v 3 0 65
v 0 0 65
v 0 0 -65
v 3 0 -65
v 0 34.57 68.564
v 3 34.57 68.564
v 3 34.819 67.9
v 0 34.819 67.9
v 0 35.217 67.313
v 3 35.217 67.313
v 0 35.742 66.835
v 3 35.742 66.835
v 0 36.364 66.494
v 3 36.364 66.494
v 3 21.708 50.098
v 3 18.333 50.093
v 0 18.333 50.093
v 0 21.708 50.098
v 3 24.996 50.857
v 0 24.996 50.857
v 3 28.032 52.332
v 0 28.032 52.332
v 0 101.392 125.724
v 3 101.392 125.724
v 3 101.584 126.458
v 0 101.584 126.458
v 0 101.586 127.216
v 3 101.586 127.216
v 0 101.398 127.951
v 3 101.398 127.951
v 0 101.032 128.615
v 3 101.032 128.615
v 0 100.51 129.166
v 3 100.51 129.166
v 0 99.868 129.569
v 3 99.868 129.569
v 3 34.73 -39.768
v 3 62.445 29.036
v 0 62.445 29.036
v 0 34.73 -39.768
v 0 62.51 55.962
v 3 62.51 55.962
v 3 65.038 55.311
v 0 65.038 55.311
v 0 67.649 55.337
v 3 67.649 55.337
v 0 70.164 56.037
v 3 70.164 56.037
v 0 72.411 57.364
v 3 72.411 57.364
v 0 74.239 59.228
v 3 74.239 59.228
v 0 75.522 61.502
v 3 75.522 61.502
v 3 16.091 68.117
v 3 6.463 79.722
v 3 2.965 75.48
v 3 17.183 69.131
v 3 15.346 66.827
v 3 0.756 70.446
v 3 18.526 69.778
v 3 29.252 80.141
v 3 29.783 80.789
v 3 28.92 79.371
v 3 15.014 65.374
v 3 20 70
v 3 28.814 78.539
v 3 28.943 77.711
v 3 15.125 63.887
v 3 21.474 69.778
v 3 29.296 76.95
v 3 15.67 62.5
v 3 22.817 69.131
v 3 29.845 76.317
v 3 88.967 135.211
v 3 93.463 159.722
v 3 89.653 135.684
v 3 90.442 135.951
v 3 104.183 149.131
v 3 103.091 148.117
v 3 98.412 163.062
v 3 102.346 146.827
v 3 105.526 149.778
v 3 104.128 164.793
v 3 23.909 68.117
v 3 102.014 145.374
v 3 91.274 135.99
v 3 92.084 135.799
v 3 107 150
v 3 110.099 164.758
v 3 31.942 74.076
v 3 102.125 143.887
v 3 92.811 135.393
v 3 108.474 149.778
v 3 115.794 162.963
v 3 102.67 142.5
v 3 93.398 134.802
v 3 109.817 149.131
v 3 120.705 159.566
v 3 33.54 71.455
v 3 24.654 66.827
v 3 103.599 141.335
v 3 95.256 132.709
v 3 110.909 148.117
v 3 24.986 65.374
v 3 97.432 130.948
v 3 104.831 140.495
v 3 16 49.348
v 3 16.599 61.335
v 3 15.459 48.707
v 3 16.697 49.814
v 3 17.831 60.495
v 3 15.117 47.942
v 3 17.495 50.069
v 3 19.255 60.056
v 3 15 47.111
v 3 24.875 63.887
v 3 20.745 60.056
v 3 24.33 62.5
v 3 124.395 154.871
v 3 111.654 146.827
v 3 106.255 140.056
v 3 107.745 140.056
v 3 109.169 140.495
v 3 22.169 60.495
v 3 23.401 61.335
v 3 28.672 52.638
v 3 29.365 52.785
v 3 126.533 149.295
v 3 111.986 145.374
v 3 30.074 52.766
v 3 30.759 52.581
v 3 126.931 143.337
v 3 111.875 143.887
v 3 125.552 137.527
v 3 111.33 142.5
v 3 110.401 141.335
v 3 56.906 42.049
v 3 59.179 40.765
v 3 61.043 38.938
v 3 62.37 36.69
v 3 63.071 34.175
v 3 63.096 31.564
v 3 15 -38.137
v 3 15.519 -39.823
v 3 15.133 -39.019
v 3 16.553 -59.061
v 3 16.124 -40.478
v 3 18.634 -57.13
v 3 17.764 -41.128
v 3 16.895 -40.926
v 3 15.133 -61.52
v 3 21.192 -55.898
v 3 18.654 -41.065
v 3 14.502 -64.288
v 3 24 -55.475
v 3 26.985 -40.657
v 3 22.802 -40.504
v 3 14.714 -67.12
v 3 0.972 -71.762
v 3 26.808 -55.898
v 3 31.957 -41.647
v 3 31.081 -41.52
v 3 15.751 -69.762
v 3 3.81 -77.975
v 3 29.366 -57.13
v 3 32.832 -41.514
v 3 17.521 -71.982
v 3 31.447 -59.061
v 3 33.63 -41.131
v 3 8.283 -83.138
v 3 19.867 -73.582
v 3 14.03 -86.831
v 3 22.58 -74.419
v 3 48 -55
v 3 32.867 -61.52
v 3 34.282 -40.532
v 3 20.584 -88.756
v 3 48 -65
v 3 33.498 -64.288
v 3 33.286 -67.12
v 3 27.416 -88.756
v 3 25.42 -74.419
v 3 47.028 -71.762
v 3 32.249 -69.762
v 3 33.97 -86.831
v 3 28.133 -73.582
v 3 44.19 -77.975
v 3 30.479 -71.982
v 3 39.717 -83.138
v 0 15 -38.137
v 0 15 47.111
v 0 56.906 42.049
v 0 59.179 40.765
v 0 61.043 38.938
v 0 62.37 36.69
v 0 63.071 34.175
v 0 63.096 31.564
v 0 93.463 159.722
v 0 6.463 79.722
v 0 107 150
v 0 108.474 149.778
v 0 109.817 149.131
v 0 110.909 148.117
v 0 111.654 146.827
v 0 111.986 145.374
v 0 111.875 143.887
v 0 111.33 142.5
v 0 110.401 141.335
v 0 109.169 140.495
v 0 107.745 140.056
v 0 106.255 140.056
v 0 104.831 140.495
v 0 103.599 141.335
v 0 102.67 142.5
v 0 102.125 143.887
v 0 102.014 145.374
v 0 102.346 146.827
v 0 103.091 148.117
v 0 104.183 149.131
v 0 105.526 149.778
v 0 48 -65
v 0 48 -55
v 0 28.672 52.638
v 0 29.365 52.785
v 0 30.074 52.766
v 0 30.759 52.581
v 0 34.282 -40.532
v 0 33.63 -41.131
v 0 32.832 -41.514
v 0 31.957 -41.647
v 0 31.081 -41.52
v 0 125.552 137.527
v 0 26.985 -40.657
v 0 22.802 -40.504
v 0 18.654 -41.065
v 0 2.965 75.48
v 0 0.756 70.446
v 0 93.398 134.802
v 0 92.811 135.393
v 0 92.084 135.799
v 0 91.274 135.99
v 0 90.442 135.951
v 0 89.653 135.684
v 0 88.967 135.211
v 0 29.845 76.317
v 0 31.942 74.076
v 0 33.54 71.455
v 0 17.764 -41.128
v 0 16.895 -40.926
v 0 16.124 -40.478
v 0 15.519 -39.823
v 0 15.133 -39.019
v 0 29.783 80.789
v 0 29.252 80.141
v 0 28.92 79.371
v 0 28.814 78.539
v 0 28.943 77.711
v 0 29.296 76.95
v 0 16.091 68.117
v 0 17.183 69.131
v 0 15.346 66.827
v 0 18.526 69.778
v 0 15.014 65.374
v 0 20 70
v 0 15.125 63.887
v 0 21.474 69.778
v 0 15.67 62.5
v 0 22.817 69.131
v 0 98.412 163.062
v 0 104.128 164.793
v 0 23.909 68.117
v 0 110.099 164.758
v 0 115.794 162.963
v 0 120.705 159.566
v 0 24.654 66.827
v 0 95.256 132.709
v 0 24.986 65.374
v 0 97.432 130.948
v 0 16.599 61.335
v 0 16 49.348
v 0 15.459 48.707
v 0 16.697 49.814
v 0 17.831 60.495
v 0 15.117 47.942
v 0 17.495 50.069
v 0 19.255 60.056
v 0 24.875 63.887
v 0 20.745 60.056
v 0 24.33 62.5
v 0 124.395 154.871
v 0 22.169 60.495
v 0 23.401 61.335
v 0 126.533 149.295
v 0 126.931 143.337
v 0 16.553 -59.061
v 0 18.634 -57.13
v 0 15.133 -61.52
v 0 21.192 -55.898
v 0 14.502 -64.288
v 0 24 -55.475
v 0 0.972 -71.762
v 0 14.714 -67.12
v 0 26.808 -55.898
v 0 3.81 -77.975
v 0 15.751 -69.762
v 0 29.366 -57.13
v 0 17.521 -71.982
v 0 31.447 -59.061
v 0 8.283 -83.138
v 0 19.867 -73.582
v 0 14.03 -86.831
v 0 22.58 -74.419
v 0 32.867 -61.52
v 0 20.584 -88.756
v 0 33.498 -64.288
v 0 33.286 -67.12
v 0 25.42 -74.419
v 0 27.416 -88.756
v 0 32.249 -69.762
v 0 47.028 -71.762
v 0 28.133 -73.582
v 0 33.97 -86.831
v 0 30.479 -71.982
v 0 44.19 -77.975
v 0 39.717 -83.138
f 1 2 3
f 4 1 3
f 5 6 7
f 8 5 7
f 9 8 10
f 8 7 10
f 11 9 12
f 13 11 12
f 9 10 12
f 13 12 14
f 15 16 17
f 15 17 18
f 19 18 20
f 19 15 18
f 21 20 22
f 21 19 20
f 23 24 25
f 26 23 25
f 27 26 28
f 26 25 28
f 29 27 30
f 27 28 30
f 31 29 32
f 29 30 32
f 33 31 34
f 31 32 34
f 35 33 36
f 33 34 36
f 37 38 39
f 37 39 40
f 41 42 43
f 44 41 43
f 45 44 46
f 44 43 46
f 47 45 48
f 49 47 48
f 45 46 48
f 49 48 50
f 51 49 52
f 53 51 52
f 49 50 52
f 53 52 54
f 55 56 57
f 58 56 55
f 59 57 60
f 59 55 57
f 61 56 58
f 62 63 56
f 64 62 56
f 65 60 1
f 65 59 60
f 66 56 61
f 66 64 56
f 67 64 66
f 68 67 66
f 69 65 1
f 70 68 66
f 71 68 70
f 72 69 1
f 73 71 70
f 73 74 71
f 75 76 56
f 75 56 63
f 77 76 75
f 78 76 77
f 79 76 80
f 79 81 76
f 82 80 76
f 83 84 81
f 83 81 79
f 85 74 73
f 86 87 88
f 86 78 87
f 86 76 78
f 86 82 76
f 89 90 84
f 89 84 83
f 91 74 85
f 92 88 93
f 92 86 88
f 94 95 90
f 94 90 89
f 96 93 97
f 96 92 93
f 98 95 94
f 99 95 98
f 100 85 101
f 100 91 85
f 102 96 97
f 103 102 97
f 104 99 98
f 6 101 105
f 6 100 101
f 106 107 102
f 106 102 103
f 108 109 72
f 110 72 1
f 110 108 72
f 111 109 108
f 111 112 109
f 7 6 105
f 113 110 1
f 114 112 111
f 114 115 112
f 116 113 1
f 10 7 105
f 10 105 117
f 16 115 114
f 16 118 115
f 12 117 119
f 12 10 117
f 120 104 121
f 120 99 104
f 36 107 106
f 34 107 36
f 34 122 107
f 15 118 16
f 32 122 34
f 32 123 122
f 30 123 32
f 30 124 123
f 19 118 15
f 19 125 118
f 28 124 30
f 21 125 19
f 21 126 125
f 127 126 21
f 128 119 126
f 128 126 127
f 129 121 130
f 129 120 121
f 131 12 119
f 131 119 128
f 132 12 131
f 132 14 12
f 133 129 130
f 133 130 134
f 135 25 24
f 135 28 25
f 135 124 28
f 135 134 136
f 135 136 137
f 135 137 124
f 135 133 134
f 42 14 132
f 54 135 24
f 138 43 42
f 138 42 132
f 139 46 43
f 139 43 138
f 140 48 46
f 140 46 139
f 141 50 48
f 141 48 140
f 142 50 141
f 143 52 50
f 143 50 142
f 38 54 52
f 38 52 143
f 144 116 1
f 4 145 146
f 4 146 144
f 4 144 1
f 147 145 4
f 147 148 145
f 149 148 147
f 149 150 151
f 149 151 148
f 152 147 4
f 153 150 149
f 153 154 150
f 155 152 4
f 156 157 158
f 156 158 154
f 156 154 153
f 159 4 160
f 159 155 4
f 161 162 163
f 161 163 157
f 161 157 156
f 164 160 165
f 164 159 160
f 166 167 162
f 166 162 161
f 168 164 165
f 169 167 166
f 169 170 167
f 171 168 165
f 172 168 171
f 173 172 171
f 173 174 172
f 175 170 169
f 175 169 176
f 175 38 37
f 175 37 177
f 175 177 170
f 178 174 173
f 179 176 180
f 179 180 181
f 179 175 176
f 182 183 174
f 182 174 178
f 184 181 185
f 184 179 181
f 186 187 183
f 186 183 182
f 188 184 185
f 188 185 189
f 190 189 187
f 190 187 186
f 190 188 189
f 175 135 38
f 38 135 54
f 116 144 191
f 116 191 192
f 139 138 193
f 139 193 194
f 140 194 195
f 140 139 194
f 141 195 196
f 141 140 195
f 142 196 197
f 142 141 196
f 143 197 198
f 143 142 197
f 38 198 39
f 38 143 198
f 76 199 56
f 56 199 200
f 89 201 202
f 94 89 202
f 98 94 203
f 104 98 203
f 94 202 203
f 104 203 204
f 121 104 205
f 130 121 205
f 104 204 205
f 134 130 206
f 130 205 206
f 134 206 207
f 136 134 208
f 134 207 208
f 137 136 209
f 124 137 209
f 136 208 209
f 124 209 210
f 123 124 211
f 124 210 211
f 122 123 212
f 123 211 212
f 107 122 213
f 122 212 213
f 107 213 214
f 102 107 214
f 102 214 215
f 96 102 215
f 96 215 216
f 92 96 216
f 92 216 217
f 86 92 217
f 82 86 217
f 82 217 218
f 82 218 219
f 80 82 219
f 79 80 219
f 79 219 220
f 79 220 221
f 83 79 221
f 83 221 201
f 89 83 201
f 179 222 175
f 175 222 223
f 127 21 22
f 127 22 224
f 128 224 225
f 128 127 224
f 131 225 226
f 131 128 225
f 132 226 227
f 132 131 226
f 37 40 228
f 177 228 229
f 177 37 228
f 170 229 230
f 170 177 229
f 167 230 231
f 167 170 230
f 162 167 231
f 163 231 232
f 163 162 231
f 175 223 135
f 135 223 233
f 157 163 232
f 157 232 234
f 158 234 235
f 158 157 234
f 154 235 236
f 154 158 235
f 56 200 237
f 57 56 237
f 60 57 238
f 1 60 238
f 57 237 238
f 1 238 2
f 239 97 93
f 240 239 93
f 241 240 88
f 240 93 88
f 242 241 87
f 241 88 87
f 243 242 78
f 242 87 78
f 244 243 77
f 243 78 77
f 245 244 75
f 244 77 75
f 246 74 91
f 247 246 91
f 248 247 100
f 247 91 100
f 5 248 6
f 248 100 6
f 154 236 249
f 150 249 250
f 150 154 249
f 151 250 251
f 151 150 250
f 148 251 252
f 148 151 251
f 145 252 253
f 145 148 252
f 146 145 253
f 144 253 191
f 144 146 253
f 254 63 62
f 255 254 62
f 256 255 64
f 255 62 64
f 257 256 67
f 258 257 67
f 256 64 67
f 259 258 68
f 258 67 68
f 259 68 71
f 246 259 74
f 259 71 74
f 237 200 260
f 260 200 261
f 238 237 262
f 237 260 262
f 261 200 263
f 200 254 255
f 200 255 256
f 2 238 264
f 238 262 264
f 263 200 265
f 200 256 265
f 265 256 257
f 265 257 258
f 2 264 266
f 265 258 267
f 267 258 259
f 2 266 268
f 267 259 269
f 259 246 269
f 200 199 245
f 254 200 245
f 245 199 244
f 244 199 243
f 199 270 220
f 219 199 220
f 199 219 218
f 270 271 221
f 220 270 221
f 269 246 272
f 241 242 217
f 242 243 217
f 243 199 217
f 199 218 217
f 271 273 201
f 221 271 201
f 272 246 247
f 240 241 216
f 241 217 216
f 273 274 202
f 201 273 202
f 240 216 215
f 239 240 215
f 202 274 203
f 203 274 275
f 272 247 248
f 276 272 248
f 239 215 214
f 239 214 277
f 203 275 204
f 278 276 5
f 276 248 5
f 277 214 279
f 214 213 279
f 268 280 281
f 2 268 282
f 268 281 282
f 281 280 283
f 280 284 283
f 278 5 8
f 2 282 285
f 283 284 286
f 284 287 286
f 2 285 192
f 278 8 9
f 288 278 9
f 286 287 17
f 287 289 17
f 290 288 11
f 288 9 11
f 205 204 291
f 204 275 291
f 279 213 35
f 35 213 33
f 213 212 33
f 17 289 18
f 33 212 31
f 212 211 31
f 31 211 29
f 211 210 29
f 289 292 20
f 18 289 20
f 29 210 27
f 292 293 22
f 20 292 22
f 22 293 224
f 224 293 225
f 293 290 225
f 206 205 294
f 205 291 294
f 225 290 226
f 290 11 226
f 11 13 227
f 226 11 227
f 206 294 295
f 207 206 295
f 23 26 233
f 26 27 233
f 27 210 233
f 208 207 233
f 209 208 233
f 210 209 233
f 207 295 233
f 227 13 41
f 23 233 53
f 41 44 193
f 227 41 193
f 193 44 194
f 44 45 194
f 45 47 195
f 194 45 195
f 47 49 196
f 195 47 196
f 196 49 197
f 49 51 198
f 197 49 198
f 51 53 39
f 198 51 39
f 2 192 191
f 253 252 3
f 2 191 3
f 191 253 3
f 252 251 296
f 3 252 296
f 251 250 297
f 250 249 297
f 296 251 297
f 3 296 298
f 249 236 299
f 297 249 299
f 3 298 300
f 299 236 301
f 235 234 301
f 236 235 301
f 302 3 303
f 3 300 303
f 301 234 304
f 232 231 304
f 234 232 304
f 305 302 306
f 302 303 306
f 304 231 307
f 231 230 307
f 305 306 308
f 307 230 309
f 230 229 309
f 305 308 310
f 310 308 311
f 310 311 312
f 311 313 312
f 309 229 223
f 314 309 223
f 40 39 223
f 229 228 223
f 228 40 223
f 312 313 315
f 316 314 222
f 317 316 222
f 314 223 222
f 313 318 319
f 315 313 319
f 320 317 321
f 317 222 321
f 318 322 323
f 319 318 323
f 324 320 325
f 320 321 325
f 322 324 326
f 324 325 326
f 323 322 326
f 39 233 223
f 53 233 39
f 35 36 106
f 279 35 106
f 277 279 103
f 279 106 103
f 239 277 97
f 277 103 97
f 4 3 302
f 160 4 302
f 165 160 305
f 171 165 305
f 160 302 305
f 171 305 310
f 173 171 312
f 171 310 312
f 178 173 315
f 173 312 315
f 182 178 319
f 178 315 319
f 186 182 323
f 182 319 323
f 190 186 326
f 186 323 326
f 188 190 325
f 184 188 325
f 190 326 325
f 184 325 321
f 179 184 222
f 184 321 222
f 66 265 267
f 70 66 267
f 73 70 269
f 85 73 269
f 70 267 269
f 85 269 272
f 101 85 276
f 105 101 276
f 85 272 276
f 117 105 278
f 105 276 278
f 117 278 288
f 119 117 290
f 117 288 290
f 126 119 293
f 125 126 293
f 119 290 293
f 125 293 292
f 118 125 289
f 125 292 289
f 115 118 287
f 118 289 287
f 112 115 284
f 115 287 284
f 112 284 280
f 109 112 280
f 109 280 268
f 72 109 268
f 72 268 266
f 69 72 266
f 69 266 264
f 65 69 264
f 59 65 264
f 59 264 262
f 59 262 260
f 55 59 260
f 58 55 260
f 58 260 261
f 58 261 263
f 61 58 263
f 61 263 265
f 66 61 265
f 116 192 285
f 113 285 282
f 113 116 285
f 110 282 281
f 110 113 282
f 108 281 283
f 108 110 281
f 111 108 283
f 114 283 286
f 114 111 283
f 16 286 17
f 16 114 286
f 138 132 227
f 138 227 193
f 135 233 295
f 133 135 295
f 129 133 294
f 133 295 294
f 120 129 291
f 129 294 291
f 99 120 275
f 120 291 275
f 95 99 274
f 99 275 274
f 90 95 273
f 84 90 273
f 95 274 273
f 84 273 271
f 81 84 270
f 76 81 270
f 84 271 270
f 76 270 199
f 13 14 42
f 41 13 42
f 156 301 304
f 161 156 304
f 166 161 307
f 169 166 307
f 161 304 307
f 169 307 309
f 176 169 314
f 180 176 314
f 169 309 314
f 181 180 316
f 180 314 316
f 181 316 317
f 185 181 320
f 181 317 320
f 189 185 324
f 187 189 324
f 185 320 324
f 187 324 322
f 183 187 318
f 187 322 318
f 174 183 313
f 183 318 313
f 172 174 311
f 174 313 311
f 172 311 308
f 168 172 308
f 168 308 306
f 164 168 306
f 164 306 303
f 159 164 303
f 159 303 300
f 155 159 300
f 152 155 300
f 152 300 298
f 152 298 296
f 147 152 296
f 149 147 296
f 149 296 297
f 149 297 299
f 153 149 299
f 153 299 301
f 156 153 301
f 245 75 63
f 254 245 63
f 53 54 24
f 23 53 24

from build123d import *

# Parameters (mm, degrees)
BOSS_EXTRUDE1_DEPTH         = 3
F_3_4_0_75_DIAMETER_HOLE1_D = 19.05
F_10_0_10_DIAMETER_HOLE1_D  = 10
F_10_0_10_DIAMETER_HOLE2_D  = 10
CUT_EXTRUDE1_REACH          = 210.238


with BuildPart() as part:
    # Sketch1 → Boss-Extrude1 (new body)
    with BuildSketch(Plane(origin=(0, 0, 0), x_dir=(0, 0, -1), z_dir=(1, 0, 0))):
        with BuildLine():
            Line((-65, 0), (65, 0))
            ThreePointArc((65, 0), (89, 24), (65, 48))
            Line((65, 48), (55, 48))
            Line((55, 48), (-137.527302422, 125.551517213))
            ThreePointArc((-137.527302422, 125.551517213), (-161.448822218, 118.377005214), (-159.721992414, 93.462535711))
            Line((-159.721992414, 93.462535711), (-79.721992414, 6.462535711))
            ThreePointArc((-79.721992414, 6.462535711), (-73.038989807, 1.686763178), (-65, 0))
        make_face()
    extrude(amount=BOSS_EXTRUDE1_DEPTH)

    # 3/4 (0.75) Diameter Hole1 (through all)
    with Locations(Plane(origin=(3, 0, 0), x_dir=(0, 0, -1), z_dir=(1, 0, 0))):
        with Locations((65, 24)):
            Hole(F_3_4_0_75_DIAMETER_HOLE1_D / 2)

    # Ø10.0 (10) Diameter Hole1 (through all)
    with Locations(Plane(origin=(3, 0, 0), x_dir=(0, 0, -1), z_dir=(1, 0, 0))):
        with Locations((-145, 107)):
            Hole(F_10_0_10_DIAMETER_HOLE1_D / 2)

    # Ø10.0 (10) Diameter Hole2 (through all)
    with Locations(Plane(origin=(3, 0, 0), x_dir=(0, 0, -1), z_dir=(1, 0, 0))):
        with Locations((-65, 20)):
            Hole(F_10_0_10_DIAMETER_HOLE2_D / 2)

    # Sketch8 → Cut-Extrude1 (cut, up to next)
    with BuildSketch(Plane(origin=(3, 0, 0), x_dir=(0, 0, -1), z_dir=(1, 0, 0)), mode=Mode.PRIVATE) as cut_extrude1_sk1:
        with BuildLine():
            Line((38.136909616, 15), (-47.11145618, 15))
            ThreePointArc((-47.11145618, 15), (-49.347524158, 16), (-50.09288015, 18.333333333))
            ThreePointArc((-50.09288015, 18.333333333), (-50.384311526, 23.373670173), (-52.331533313, 28.031808751))
            ThreePointArc((-52.331533313, 28.031808751), (-52.785410617, 29.365367154), (-52.580567558, 30.759075138))
            Line((-52.580567558, 30.759075138), (-42.048503485, 56.905692997))
            ThreePointArc((-42.048503485, 56.905692997), (-36.689699124, 62.370293585), (-29.036396089, 62.445102815))
            Line((-29.036396089, 62.445102815), (39.768193948, 34.730070809))
            ThreePointArc((39.768193948, 34.730070809), (41.351904066, 33.245441463), (41.519519359, 31.08114778))
            ThreePointArc((41.519519359, 31.08114778), (40.491403893, 24.896851079), (41.064766878, 18.653950954))
            ThreePointArc((41.064766878, 18.653950954), (40.478047465, 16.124080607), (38.136909616, 15))
        make_face()
    cut_extrude1_tool1 = extrude(cut_extrude1_sk1.sketch, amount=-CUT_EXTRUDE1_REACH, mode=Mode.PRIVATE) & part.part
    # Sketch8 → Cut-Extrude1 (cut, up to next)
    with BuildSketch(Plane(origin=(3, 0, 0), x_dir=(0, 0, -1), z_dir=(1, 0, 0)), mode=Mode.PRIVATE) as cut_extrude1_sk2:
        with BuildLine():
            Line((-135.210891206, 88.967436427), (-80.78877426, 29.783384249))
            ThreePointArc((-80.78877426, 29.783384249), (-78.53914012, 28.814288673), (-76.317062832, 29.845003243))
            ThreePointArc((-76.317062832, 29.845003243), (-72.806710034, 32.808406554), (-68.564110875, 34.570419132))
            ThreePointArc((-68.564110875, 34.570419132), (-67.312603666, 35.217035191), (-66.494205468, 36.363598321))
            Line((-66.494205468, 36.363598321), (-55.962141395, 62.51021618))
            ThreePointArc((-55.962141395, 62.51021618), (-56.036950624, 70.163519215), (-61.501551212, 75.522323576))
            Line((-61.501551212, 75.522323576), (-125.724416937, 101.391800861))
            ThreePointArc((-125.724416937, 101.391800861), (-127.951011637, 101.397881175), (-129.568523338, 99.867712287))
            ThreePointArc((-129.568523338, 99.867712287), (-131.78341646, 96.307857113), (-134.802203492, 93.39834766))
            ThreePointArc((-134.802203492, 93.39834766), (-135.989912088, 91.27359327), (-135.210891206, 88.967436427))
        make_face()
    cut_extrude1_tool2 = extrude(cut_extrude1_sk2.sketch, amount=-CUT_EXTRUDE1_REACH, mode=Mode.PRIVATE) & part.part
    add(cut_extrude1_tool1.solids().sort_by_distance((3, 33.678975, 9.935065))[0], mode=Mode.SUBTRACT)
    add(cut_extrude1_tool2.solids().sort_by_distance((3, 67.393587, 91.526905))[0], mode=Mode.SUBTRACT)


solid = part.part
